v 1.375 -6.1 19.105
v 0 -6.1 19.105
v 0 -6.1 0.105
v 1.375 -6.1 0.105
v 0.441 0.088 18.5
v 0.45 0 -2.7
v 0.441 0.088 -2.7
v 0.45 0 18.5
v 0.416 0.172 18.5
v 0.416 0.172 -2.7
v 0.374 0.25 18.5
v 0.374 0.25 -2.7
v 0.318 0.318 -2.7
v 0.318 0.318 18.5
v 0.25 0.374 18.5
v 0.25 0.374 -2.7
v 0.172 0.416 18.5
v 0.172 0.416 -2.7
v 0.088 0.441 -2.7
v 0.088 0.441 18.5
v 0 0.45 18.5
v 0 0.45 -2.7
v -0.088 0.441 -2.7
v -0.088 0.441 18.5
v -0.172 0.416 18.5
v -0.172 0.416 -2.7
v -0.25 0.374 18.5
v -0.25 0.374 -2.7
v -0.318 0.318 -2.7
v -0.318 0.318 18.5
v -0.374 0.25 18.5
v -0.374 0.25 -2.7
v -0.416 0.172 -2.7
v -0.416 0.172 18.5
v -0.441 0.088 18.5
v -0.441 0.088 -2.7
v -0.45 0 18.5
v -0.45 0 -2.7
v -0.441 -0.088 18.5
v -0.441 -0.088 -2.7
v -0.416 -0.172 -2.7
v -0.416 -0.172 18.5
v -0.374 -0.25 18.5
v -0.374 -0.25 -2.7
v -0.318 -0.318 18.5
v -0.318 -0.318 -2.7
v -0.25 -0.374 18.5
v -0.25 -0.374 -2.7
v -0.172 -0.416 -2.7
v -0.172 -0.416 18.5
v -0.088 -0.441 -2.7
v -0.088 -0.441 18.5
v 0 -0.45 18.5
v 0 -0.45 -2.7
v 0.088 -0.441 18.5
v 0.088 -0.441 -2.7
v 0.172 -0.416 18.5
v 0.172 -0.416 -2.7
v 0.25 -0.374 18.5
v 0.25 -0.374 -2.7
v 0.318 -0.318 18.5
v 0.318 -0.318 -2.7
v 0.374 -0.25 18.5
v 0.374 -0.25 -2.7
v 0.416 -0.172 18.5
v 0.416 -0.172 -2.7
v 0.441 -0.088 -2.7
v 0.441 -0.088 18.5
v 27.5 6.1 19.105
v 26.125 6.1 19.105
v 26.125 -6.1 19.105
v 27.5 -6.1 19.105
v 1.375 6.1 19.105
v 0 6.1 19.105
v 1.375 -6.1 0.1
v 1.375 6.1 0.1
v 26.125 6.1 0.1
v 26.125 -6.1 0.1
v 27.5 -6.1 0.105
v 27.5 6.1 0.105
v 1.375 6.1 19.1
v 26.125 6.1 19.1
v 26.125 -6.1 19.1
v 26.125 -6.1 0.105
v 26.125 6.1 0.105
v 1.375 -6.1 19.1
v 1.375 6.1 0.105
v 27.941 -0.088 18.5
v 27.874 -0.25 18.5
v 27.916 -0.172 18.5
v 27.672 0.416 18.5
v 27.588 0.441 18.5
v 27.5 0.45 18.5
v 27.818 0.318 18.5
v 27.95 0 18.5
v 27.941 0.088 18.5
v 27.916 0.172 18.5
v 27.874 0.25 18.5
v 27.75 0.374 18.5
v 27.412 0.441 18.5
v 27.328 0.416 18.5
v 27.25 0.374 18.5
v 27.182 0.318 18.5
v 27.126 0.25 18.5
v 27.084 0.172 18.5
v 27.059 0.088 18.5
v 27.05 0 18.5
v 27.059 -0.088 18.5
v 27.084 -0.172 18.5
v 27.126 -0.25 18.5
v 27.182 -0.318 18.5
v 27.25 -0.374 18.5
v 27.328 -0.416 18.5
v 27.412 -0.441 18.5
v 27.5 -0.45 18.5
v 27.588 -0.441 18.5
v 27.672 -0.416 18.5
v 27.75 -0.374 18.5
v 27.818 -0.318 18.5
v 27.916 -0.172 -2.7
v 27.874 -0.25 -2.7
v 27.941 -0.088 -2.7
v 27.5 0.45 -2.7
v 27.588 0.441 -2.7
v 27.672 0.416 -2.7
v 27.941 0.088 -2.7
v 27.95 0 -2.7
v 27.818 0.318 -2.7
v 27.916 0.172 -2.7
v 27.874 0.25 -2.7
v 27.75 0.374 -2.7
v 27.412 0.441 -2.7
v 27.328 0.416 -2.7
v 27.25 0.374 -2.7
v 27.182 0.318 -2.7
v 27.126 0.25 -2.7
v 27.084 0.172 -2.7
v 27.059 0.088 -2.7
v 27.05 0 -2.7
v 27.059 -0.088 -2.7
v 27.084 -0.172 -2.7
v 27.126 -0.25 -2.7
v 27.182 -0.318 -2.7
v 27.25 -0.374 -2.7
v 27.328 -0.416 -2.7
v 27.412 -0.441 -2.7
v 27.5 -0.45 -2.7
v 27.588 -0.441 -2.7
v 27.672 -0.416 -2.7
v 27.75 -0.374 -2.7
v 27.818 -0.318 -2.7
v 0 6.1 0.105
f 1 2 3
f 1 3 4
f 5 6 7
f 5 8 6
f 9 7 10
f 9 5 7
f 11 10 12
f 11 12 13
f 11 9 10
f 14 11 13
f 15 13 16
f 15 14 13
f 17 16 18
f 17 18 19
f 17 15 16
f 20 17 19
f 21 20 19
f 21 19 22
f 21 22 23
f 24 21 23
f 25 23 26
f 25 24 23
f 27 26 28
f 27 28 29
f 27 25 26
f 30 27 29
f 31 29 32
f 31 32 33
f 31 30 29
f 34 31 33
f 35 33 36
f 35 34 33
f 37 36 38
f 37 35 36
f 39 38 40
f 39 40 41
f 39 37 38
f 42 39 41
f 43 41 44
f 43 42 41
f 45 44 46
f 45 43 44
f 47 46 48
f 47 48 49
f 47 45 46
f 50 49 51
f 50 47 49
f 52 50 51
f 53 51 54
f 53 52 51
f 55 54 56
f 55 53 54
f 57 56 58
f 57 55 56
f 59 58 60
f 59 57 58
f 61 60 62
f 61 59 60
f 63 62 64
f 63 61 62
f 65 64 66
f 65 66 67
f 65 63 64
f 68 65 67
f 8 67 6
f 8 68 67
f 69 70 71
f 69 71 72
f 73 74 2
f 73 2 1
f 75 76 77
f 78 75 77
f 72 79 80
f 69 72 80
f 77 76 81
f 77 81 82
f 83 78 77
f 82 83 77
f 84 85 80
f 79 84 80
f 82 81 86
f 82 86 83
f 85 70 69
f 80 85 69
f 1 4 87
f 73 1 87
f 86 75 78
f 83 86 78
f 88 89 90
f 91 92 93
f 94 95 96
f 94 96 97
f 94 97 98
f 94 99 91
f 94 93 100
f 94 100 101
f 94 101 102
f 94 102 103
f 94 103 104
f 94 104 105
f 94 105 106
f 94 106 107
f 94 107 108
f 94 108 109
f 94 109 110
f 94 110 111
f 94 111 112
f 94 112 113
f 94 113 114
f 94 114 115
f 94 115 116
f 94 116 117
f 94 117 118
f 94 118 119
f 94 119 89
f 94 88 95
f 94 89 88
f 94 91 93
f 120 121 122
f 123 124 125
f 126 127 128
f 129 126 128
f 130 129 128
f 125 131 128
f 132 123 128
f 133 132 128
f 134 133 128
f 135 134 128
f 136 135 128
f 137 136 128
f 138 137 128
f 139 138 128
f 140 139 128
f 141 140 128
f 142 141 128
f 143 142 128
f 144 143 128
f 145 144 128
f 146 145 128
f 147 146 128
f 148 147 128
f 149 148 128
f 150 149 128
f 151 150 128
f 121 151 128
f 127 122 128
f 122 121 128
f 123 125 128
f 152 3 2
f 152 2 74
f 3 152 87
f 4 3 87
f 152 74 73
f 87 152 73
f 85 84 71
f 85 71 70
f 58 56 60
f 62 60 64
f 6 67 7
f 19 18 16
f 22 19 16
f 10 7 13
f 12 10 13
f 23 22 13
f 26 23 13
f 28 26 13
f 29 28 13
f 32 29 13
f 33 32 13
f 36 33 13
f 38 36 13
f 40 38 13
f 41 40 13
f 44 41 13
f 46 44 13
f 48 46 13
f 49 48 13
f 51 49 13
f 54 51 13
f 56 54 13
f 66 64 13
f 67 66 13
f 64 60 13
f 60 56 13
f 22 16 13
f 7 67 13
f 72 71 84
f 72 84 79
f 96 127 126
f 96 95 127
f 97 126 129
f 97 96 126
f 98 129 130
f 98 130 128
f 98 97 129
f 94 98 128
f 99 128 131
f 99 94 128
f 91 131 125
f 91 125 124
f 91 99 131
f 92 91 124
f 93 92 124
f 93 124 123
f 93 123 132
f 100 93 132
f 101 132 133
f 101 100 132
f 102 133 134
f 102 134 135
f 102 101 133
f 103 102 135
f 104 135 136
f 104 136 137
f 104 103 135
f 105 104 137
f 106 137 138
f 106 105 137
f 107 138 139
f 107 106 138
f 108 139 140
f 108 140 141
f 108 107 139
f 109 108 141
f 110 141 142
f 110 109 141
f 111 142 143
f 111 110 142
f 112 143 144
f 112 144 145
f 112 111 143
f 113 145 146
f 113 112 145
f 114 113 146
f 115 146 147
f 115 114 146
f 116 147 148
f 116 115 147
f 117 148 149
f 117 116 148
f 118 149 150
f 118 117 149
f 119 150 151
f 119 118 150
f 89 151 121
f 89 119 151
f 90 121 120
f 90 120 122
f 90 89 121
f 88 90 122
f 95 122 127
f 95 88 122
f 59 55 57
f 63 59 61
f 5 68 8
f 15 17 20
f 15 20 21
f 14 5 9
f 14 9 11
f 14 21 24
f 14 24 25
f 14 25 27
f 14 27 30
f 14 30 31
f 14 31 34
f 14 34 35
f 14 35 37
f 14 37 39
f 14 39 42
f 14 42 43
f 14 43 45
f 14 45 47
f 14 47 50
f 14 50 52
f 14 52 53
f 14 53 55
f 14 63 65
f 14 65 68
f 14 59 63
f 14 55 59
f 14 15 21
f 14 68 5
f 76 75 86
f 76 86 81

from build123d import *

# Parameters (mm, degrees)
SKETCH_W          = 24.75
SKETCH_H          = 12.2
PAD_DEPTH         = 19
SKETCH001_R       = 0.45
PAD001_DEPTH      = 18
PAD001_DEPTH_BACK = 3.2
SKETCH002_W       = 1.375
SKETCH002_H       = 12.2
PAD002_DEPTH      = 19


with BuildPart() as pad:
    # Sketch → Pad (new body)
    with BuildSketch(Plane.XY.offset(0.1)):
        with Locations((13.75, 0)):
            Rectangle(SKETCH_W, SKETCH_H)
    extrude(amount=PAD_DEPTH)


with BuildPart() as pad001:
    # Sketch001 → Pad001 (new body, two sides)
    with BuildSketch(Plane.XY.offset(0.5)) as pad001_sk:
        Circle(SKETCH001_R)
        with Locations((27.5, 0)):
            Circle(SKETCH001_R)
    extrude(amount=PAD001_DEPTH)
    extrude(pad001_sk.sketch, amount=-PAD001_DEPTH_BACK)


with BuildPart() as pad002:
    # Sketch002 → Pad002 (new body)
    with BuildSketch(Plane.XY.offset(0.105)):
        with Locations((0.6875, 0)):
            Rectangle(SKETCH002_W, SKETCH002_H)
        with Locations((26.8125, 0)):
            Rectangle(SKETCH002_W, SKETCH002_H)
    extrude(amount=PAD002_DEPTH)


solid = Compound([pad.part, pad001.part, pad002.part])
